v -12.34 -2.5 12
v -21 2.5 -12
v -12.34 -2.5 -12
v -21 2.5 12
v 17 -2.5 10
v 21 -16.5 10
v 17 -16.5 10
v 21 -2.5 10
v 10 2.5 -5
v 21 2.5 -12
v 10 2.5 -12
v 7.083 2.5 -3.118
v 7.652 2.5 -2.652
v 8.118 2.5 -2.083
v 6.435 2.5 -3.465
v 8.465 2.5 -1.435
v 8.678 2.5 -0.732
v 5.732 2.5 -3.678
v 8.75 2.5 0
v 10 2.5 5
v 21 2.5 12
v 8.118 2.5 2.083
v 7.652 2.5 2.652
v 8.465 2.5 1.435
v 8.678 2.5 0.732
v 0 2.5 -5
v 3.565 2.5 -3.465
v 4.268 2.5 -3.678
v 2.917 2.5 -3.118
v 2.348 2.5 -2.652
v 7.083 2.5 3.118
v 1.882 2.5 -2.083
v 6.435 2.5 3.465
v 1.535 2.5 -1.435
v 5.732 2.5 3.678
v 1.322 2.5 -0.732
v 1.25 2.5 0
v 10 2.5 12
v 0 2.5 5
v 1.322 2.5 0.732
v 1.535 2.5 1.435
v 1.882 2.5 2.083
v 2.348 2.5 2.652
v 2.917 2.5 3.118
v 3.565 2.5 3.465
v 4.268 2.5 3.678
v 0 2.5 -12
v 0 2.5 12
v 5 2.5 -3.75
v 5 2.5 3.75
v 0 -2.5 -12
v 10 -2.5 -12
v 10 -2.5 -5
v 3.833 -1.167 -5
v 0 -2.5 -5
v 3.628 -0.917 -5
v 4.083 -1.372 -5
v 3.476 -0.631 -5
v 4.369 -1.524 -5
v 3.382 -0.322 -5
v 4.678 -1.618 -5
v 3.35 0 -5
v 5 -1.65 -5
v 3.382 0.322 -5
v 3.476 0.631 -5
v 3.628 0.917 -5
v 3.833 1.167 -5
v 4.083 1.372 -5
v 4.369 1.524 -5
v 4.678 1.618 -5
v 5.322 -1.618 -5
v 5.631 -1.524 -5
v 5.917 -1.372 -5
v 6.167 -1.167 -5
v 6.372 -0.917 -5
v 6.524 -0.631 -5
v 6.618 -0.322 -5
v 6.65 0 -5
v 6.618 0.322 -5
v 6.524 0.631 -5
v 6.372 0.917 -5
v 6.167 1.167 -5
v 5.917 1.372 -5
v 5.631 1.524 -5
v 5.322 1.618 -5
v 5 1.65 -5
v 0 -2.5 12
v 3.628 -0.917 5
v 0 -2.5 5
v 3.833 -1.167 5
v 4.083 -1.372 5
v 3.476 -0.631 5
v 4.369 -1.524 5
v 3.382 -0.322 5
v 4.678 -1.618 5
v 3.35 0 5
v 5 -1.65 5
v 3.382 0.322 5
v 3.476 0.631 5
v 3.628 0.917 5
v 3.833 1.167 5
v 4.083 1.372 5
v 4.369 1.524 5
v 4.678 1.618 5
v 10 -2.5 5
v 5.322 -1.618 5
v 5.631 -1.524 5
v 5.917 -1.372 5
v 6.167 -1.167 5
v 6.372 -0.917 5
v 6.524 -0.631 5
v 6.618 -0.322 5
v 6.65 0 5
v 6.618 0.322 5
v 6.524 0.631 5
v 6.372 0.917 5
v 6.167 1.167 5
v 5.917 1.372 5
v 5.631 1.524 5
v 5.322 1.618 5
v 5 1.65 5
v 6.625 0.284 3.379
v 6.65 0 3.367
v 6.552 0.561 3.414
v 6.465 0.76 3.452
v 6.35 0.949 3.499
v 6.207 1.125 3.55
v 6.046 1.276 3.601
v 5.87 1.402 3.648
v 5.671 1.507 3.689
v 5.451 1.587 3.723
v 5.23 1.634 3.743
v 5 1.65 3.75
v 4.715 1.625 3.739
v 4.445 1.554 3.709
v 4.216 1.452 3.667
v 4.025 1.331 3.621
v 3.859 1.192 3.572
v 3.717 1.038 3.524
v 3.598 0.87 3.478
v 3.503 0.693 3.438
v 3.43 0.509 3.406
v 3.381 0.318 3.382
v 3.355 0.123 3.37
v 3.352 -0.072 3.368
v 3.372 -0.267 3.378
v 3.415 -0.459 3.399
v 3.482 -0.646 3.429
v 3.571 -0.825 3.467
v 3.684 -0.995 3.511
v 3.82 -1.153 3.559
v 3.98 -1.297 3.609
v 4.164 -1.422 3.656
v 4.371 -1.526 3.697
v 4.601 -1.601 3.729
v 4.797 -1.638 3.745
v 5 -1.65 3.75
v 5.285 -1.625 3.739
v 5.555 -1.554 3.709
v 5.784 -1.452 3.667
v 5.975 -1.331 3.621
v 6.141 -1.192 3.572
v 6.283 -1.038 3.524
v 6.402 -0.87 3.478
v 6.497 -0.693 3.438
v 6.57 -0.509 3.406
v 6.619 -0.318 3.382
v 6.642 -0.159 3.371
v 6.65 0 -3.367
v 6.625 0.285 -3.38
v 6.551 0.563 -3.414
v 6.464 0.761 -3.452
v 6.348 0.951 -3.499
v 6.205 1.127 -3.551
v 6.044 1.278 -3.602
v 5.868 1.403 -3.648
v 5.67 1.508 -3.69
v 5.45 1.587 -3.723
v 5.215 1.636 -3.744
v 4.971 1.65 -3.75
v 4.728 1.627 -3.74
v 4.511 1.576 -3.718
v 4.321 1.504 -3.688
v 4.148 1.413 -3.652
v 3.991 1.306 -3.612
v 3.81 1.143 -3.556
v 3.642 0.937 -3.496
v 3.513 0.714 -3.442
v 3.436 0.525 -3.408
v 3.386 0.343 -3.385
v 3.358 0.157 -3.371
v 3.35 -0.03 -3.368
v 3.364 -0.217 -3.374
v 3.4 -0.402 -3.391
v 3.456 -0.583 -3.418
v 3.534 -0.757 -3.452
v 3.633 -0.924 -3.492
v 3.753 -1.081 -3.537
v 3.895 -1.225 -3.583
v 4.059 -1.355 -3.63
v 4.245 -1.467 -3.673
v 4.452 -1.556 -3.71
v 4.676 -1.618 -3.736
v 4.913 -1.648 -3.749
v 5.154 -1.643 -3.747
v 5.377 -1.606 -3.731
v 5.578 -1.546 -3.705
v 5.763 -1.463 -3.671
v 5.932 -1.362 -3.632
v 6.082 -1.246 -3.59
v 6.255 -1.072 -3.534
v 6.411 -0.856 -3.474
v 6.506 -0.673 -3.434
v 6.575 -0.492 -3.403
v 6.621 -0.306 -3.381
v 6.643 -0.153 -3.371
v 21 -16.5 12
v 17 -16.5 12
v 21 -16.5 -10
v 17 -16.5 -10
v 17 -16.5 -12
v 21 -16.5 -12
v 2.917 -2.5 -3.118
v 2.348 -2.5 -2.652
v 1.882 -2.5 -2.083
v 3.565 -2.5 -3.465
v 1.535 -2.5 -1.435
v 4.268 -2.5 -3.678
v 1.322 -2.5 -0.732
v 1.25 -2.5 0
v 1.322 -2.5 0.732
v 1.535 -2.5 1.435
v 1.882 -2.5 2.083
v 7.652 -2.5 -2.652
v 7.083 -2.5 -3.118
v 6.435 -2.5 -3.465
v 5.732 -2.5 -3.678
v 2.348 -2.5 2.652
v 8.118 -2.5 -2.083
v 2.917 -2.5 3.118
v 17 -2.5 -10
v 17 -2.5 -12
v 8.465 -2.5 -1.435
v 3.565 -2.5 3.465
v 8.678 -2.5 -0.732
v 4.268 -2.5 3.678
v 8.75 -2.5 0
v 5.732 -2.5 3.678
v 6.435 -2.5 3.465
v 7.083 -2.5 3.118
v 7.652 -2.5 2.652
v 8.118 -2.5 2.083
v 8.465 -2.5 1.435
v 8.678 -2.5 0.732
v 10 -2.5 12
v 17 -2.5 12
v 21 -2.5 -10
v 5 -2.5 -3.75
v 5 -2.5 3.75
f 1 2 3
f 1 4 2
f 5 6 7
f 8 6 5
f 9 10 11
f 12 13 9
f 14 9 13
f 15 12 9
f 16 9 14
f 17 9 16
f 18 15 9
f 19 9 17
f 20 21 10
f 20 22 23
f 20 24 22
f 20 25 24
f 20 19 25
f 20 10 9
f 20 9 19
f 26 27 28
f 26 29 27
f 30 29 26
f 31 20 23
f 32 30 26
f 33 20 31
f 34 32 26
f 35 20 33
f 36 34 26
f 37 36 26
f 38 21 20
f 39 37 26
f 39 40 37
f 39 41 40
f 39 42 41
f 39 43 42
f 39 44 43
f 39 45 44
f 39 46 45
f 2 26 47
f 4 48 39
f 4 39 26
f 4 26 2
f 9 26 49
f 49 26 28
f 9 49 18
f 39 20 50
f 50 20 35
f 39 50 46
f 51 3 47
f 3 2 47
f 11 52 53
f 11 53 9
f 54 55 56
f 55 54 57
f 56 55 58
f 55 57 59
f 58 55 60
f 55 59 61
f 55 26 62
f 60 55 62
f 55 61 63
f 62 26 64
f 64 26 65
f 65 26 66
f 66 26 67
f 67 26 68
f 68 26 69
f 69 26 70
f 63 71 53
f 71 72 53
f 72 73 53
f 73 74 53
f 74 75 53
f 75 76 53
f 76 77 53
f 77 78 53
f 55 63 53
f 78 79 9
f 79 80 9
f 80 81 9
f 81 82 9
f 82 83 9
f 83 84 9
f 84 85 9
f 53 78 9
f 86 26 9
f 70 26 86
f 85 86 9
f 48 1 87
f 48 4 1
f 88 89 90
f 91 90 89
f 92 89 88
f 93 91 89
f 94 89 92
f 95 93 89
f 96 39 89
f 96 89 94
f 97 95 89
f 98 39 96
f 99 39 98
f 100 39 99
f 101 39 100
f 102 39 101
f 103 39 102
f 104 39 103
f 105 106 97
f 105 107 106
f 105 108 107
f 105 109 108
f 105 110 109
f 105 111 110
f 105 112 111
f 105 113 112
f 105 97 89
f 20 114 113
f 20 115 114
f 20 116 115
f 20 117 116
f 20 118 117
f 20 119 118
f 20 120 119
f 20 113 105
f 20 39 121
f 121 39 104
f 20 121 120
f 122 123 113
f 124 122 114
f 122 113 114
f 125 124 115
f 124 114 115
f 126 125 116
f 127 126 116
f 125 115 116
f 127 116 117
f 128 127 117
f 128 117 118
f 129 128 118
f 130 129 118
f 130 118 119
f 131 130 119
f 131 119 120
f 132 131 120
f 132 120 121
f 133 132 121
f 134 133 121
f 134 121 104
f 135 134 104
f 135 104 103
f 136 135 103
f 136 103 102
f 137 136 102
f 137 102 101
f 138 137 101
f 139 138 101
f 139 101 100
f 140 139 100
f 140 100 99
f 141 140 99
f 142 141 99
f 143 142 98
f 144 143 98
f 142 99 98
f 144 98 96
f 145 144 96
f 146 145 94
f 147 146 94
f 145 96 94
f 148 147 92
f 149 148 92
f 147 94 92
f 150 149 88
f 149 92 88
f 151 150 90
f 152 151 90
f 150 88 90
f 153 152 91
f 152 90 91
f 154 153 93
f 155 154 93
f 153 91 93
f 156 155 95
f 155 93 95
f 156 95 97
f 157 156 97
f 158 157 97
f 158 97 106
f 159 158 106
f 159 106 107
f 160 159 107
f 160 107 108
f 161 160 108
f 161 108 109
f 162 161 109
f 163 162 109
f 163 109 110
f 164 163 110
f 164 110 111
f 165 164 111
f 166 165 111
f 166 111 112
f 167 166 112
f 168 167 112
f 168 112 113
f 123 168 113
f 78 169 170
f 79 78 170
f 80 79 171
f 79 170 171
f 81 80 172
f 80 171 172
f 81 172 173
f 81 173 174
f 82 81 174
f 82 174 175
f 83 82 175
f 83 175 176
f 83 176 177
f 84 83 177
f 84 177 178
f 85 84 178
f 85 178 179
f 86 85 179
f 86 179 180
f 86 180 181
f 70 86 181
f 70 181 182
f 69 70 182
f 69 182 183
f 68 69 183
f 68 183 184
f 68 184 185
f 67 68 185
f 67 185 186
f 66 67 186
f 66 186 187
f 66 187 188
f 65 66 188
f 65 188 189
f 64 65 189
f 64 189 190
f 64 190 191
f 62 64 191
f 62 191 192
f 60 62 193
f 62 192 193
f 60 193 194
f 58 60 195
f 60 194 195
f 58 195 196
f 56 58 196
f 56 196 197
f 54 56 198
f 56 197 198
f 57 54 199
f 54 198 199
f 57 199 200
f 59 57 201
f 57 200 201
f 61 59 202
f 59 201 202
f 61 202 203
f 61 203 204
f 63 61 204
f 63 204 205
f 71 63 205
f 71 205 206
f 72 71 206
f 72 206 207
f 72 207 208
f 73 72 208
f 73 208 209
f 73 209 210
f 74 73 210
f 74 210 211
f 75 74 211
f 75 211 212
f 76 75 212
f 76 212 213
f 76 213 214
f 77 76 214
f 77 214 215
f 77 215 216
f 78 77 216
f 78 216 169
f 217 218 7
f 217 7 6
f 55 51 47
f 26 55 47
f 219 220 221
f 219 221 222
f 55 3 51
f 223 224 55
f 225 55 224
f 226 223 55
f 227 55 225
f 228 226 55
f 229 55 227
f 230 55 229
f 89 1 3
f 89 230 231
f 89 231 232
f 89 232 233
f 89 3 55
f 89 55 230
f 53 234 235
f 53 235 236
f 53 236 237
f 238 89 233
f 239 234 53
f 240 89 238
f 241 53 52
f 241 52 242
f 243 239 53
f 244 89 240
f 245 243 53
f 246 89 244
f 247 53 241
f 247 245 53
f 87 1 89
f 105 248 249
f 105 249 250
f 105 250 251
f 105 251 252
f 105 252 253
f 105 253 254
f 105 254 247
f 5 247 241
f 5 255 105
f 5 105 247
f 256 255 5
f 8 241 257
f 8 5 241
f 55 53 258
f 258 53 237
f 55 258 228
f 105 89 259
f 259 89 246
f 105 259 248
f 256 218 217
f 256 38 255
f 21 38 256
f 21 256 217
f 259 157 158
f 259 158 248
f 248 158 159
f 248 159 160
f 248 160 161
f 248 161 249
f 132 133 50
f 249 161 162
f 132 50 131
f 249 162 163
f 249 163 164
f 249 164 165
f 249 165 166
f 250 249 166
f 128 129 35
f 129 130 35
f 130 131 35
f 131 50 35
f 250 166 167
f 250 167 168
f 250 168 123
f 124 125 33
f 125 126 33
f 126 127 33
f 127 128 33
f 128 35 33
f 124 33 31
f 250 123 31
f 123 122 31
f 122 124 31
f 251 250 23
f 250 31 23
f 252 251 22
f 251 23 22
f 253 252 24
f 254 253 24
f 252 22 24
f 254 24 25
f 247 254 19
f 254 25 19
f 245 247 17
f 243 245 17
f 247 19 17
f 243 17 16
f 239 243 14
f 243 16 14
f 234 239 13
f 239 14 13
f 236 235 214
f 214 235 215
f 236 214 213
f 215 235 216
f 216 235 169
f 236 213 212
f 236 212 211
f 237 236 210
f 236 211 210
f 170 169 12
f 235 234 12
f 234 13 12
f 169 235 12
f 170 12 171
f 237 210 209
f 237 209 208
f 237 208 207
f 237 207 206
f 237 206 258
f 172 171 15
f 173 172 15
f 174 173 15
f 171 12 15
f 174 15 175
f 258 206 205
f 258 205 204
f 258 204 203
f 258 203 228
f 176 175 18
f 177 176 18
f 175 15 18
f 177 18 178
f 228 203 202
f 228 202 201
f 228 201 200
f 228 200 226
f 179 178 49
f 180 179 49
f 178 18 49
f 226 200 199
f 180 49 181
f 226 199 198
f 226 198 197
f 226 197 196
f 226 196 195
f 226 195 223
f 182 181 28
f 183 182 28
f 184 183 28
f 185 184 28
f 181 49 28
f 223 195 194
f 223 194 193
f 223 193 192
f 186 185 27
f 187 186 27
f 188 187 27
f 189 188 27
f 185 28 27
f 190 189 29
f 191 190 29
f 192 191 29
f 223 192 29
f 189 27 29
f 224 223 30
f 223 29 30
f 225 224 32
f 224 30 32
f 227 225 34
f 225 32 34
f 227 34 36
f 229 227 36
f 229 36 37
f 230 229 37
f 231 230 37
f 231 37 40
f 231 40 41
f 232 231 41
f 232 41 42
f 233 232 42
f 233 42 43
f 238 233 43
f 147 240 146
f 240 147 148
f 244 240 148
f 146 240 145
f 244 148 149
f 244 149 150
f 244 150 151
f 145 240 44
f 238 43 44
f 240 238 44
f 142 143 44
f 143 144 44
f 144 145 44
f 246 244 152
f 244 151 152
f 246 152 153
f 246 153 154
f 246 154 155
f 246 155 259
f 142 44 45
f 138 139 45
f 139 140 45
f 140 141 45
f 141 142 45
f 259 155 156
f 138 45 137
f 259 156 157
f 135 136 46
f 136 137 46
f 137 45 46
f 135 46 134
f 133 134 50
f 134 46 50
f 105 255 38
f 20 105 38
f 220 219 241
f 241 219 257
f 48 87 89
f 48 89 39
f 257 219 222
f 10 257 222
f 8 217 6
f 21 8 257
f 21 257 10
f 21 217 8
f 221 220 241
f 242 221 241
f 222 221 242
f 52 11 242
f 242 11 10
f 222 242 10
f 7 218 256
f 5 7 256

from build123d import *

# Parameters (mm, degrees)
BOSS_EXTRUDE1_DEPTH = 12
CUT_EXTRUDE1_REACH  = 33.988
SKETCH4_R           = 1.65
SKETCH4_3_W         = 10
SKETCH4_3_H         = 5
SKETCH4_3_R         = 1.65
CUT_EXTRUDE3_DEPTH  = 7
CUT_EXTRUDE2_REACH  = 26.698
SKETCH5_R           = 3.75
SKETCH6_W           = 4
SKETCH6_H           = 14
BOSS_EXTRUDE2_DEPTH = 24
SKETCH7_W           = 20
SKETCH7_H           = 14
CUT_EXTRUDE4_DEPTH  = 10


with BuildPart() as part:
    # Sketch3 → Boss-Extrude1 (new, symmetric)
    with BuildSketch(Plane.XY):
        Polygon((-21, 2.5), (-12.339745962, -2.5), (21, -2.5), (21, 2.5), align=None)
    extrude(amount=BOSS_EXTRUDE1_DEPTH, both=True)

    # Sketch4 → Cut-Extrude1 (cut, up to next)
    with BuildSketch(Plane.XY.offset(12), mode=Mode.PRIVATE) as cut_extrude1_sk1:
        with Locations((5, 0)):
            Circle(SKETCH4_R)
    cut_extrude1_tool1 = extrude(cut_extrude1_sk1.sketch, amount=-CUT_EXTRUDE1_REACH, mode=Mode.PRIVATE) & part.part
    add(cut_extrude1_tool1.solids().sort_by_distance((5, 0, 12))[0], mode=Mode.SUBTRACT)

    # Sketch4<3> → Cut-Extrude3 (cut)
    with BuildSketch(Plane.XY.offset(12)):
        with Locations((5, 0)):
            Rectangle(SKETCH4_3_W, SKETCH4_3_H)
        with Locations((5, 0)):
            Circle(SKETCH4_3_R, mode=Mode.SUBTRACT)
    cut_extrude3 = extrude(amount=-CUT_EXTRUDE3_DEPTH, mode=Mode.SUBTRACT)

    # Mirror1: Cut-Extrude3 across plane
    add(cut_extrude3.mirror(Plane.XY), mode=Mode.SUBTRACT)

    # Sketch5 → Cut-Extrude2 (cut, up to next)
    with BuildSketch(Plane(origin=(0, 2.5, 0), x_dir=(1, 0, 0), z_dir=(0, 1, 0)), mode=Mode.PRIVATE) as cut_extrude2_sk1:
        with Locations(Location((5, 0, 0), (0, 0, 270))):
            Circle(SKETCH5_R)
    cut_extrude2_tool1 = extrude(cut_extrude2_sk1.sketch, amount=-CUT_EXTRUDE2_REACH, mode=Mode.PRIVATE) & part.part
    add(cut_extrude2_tool1.solids().sort_by_distance((5, 2.5, 0))[0], mode=Mode.SUBTRACT)

    # Sketch6 → Boss-Extrude2 (add)
    with BuildSketch(Plane.XY.offset(12)):
        with Locations((19, -9.5)):
            Rectangle(SKETCH6_W, SKETCH6_H)
    extrude(amount=-BOSS_EXTRUDE2_DEPTH)

    # Sketch7 → Cut-Extrude4 (cut)
    with BuildSketch(Plane(origin=(21, 0, 0), x_dir=(0, 0, -1), z_dir=(1, 0, 0))):
        with Locations((0, -9.5)):
            Rectangle(SKETCH7_W, SKETCH7_H)
    extrude(amount=-CUT_EXTRUDE4_DEPTH, mode=Mode.SUBTRACT)


solid = part.part
